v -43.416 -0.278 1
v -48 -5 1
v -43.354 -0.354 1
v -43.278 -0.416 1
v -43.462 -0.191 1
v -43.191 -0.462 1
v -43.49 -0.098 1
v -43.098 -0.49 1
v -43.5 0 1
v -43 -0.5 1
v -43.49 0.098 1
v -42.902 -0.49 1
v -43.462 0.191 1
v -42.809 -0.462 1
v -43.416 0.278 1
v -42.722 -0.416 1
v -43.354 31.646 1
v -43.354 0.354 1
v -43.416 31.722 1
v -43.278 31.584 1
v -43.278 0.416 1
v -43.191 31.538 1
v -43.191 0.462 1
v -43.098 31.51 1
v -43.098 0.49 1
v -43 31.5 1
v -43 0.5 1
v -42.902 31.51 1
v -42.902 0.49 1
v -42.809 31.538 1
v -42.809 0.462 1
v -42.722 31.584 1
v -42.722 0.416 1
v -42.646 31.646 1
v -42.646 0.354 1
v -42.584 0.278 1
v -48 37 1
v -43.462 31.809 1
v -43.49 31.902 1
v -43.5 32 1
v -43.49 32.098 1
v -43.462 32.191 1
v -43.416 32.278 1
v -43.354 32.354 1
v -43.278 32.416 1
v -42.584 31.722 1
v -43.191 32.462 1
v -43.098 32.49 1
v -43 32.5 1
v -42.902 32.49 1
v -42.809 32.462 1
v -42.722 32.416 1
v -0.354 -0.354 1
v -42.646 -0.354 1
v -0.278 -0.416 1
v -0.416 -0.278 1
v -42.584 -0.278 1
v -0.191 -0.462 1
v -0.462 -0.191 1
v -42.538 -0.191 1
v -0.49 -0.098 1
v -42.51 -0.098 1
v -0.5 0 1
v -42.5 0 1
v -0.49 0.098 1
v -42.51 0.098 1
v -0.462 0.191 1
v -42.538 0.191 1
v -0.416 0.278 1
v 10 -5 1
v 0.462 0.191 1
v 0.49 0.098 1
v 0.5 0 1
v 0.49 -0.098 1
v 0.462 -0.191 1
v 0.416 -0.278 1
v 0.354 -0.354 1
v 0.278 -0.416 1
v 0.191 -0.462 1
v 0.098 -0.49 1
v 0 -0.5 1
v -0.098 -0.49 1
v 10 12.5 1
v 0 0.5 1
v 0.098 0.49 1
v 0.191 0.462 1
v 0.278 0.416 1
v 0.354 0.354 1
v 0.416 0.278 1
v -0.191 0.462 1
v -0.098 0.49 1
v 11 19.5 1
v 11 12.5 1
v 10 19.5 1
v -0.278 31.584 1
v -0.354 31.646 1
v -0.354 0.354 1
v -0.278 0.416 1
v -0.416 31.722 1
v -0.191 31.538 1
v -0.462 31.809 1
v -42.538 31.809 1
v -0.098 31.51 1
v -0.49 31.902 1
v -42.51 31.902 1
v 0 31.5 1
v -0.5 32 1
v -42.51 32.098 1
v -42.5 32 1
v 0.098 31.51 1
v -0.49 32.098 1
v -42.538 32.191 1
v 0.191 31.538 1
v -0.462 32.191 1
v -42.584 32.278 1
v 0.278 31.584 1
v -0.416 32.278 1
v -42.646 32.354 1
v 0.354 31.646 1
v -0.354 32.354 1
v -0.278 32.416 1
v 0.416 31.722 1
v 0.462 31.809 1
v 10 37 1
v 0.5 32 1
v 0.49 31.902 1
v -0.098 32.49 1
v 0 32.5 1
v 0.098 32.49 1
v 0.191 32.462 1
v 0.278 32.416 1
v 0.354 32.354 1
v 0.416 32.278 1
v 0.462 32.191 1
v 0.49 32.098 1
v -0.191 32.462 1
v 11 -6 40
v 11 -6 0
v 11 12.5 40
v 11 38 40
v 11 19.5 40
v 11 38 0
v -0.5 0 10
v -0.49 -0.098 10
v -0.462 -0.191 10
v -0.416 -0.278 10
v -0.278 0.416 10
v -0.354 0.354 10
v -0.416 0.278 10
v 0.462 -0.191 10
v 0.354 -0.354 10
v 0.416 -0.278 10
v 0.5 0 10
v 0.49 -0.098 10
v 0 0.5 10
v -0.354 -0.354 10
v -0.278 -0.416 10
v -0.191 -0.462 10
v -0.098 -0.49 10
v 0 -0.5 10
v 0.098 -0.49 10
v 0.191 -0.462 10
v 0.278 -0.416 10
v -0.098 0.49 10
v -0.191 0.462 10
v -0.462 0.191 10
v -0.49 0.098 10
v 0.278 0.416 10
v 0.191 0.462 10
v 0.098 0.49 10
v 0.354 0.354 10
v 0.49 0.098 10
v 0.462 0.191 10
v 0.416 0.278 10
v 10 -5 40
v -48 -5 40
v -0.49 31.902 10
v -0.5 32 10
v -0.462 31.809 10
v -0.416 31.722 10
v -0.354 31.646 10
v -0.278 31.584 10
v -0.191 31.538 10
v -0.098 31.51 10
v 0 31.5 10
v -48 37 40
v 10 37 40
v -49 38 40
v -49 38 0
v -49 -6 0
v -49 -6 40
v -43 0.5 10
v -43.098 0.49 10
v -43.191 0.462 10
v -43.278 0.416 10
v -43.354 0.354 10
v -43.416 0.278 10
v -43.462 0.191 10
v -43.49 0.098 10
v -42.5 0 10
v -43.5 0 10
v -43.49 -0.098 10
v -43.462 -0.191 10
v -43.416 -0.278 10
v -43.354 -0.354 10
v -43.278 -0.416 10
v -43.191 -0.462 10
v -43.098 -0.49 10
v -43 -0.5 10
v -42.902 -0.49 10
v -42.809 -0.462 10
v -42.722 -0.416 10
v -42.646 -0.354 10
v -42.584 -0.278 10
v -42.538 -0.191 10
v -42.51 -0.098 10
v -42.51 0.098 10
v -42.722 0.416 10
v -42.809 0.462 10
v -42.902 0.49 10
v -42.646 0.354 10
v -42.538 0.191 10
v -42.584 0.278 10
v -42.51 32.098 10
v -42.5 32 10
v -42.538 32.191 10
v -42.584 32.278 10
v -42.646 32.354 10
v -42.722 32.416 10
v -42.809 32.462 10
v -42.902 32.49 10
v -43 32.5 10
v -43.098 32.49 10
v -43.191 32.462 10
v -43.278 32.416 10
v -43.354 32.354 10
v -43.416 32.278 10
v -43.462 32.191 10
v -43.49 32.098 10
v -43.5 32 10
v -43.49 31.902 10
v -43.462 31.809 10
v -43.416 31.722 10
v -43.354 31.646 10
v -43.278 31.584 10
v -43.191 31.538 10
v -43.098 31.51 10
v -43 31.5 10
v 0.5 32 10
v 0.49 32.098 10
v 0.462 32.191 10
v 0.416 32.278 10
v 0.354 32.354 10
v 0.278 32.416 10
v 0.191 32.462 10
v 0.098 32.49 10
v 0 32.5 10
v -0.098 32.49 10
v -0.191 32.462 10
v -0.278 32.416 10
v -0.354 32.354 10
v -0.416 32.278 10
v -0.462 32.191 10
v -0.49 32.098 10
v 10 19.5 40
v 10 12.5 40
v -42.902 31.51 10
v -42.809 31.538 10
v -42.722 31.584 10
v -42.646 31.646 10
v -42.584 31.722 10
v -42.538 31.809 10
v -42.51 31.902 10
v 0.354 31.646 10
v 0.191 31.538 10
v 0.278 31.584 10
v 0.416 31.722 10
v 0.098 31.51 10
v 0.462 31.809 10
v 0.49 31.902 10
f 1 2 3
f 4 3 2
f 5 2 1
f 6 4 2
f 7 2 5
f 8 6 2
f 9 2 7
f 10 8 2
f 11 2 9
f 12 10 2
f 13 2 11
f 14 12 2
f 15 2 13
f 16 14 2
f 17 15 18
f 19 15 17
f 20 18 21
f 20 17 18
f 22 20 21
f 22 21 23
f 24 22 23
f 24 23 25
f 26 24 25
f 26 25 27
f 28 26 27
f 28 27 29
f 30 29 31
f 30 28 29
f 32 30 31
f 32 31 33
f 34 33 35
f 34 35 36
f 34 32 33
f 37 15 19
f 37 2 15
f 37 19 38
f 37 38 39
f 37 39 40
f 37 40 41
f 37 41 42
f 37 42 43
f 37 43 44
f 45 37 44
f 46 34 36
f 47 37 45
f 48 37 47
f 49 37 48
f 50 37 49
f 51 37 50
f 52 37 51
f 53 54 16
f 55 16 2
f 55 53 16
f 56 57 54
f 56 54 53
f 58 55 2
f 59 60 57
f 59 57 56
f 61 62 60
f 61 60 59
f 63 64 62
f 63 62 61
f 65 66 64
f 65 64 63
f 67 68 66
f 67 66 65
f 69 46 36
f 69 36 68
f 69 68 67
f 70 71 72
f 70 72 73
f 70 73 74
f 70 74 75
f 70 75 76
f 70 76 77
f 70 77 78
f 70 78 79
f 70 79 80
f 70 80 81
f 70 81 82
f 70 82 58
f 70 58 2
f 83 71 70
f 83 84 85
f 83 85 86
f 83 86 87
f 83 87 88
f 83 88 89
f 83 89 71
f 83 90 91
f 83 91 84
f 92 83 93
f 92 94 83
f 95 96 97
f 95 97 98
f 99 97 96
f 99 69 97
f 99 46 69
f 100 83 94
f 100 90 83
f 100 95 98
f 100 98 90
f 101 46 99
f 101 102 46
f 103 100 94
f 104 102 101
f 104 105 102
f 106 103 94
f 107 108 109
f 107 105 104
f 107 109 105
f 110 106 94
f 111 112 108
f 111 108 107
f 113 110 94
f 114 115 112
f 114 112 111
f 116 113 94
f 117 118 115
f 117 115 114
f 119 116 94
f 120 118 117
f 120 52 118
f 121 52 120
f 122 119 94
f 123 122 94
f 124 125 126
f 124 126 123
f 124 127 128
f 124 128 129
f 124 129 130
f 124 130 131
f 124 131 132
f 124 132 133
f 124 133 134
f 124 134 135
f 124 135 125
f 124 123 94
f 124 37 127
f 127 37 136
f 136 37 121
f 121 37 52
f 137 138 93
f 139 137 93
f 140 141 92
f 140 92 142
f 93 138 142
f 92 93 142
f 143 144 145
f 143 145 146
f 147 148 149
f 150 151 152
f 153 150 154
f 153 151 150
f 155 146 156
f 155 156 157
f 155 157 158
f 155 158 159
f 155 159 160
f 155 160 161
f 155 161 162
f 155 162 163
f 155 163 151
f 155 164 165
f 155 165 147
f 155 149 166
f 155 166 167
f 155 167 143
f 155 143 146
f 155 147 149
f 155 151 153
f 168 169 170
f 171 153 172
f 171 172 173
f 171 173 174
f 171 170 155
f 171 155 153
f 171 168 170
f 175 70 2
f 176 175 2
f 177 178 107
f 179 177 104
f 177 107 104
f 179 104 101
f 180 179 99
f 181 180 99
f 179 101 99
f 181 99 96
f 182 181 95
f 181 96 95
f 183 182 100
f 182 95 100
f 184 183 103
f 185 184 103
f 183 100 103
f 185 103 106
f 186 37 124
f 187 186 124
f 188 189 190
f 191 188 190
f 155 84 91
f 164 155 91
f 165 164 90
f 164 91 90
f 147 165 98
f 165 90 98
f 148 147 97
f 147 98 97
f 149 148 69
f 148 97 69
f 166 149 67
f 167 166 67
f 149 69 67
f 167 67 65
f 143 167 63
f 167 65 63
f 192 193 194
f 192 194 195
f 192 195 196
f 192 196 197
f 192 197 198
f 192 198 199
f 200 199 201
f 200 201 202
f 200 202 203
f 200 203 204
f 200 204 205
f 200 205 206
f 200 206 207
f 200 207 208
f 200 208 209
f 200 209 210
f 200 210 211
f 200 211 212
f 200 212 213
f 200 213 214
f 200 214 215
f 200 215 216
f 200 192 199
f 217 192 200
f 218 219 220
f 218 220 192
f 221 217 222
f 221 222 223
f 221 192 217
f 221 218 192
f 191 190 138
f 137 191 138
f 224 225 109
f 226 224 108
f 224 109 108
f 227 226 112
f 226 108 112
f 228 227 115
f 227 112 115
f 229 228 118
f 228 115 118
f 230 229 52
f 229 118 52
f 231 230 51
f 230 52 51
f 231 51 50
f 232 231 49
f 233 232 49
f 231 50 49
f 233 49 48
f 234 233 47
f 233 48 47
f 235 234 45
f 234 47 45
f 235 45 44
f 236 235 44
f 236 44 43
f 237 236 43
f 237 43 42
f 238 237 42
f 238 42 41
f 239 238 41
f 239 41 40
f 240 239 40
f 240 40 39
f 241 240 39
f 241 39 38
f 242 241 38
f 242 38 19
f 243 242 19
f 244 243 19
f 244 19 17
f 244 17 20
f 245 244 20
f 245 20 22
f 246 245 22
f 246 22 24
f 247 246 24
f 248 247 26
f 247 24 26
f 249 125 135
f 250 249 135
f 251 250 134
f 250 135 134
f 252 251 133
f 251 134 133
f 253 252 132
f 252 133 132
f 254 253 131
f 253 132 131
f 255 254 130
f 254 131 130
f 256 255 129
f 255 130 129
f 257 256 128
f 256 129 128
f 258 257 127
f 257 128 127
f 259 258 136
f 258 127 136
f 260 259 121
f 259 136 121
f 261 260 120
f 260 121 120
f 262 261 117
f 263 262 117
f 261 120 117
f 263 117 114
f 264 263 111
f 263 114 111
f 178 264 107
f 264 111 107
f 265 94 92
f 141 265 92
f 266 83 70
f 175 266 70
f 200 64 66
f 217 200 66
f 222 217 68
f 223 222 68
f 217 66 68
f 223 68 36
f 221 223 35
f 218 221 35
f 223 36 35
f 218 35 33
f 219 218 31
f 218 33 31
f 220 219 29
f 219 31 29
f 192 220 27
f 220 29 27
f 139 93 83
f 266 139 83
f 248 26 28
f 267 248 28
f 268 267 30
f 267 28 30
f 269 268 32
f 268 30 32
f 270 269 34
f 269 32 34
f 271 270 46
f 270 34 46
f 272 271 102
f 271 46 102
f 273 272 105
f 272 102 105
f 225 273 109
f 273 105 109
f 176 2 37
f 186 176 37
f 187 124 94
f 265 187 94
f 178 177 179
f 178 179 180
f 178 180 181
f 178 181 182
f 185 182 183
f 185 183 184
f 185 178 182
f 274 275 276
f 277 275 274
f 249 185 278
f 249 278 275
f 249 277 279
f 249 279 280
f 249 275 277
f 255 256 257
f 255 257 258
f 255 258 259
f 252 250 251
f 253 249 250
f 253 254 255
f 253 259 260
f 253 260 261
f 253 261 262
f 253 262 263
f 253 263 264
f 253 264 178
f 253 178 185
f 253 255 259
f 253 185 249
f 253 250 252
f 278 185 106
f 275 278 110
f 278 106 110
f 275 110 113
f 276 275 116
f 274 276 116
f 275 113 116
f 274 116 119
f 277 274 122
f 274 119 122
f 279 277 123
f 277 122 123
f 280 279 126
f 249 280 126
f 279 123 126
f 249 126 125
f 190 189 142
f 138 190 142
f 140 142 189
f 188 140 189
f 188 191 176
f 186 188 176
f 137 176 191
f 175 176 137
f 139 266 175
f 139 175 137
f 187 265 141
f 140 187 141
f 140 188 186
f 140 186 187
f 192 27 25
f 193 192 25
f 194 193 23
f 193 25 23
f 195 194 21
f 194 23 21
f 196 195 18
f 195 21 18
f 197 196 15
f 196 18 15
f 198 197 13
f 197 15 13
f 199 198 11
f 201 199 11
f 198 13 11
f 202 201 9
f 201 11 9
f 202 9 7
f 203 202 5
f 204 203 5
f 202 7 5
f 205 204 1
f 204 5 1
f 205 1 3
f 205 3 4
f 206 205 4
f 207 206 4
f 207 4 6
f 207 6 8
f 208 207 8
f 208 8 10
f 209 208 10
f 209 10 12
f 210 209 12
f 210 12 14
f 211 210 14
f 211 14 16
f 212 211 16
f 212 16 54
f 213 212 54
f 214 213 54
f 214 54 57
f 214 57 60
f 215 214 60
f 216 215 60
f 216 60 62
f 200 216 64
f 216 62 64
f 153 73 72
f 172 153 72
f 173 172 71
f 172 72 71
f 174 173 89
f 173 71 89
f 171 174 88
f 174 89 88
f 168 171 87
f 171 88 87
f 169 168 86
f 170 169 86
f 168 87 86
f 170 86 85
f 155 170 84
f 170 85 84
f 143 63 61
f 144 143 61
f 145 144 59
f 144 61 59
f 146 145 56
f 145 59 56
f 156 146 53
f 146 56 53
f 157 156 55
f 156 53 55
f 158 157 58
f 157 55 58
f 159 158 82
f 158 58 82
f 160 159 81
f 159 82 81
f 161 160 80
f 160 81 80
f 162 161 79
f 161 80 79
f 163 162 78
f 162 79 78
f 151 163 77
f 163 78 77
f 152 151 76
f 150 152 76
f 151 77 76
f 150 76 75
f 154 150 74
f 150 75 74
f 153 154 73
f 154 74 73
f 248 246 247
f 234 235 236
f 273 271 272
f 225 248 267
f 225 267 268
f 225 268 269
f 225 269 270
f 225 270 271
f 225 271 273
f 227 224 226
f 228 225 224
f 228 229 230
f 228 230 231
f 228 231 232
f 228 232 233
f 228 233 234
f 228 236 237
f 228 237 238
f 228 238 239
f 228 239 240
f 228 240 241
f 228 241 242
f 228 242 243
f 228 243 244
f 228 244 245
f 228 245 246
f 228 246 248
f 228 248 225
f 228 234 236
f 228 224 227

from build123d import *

# Parameters (mm, degrees)
F1_DEPTH = 40
F0_W     = 1
F0_H     = 7
F2_DEPTH = 1
F3_DEPTH = 10


with BuildPart() as f1:
    # F0 (on Top) → F1 (new body)
    with BuildSketch(Plane.XY):
        Polygon((10, -5), (-48, -5), (-48, 37), (10, 37), (10, 19.5), (11, 19.5), (11, 38), (-49, 38), (-49, -6), (11, -6), (11, 12.5), (10, 12.5), align=None)
    extrude(amount=F1_DEPTH)

    # F0 (on Top) → F2 (join)
    with BuildSketch(Plane.XY):
        Polygon((-48, 37), (-48, -5), (10, -5), (10, 12.5), (10, 19.5), (10, 37), align=None)
        with BuildLine():
            Line((-0.5, 0), (-42.5, 0))
            ThreePointArc((-42.5, 0), (-43.3535533906, -0.3535533906), (-43, 0.5))
            Line((-43, 0.5), (-43, 31.5))
            ThreePointArc((-43, 31.5), (-43.3535533906, 32.3535533906), (-42.5, 32))
            Line((-42.5, 32), (-0.5, 32))
            ThreePointArc((-0.5, 32), (0, 32.5), (0.5, 32))
            ThreePointArc((0.5, 32), (0.3535533906, 31.6464466094), (0, 31.5))
            Line((0, 31.5), (0, 0.5))
            ThreePointArc((0, 0.5), (0.3535533906, 0.3535533906), (0.5, 0))
            ThreePointArc((0.5, 0), (0, -0.5), (-0.5, 0))
        make_face(mode=Mode.SUBTRACT)
        with BuildLine():
            ThreePointArc((-43, 0.5), (-42.6464466094, 0.3535533906), (-42.5, 0))
            Line((-42.5, 0), (-0.5, 0))
            ThreePointArc((-0.5, 0), (-0.3535533906, 0.3535533906), (0, 0.5))
            Line((0, 0.5), (0, 31.5))
            ThreePointArc((0, 31.5), (-0.3535533906, 31.6464466094), (-0.5, 32))
            Line((-0.5, 32), (-42.5, 32))
            ThreePointArc((-42.5, 32), (-42.6464466094, 31.6464466094), (-43, 31.5))
            Line((-43, 31.5), (-43, 0.5))
        make_face()
        Polygon((10, -5), (-48, -5), (-48, 37), (10, 37), (10, 19.5), (11, 19.5), (11, 38), (-49, 38), (-49, -6), (11, -6), (11, 12.5), (10, 12.5), align=None)
        with Locations((10.5, 16)):
            Rectangle(F0_W, F0_H)
        with BuildLine():
            Line((-42.5, 0), (-43, 0))
            Line((-43, 0), (-43, 0.5))
            ThreePointArc((-43, 0.5), (-43.3535533906, -0.3535533906), (-42.5, 0))
        make_face()
        with BuildLine():
            Line((0, 0), (-0.5, 0))
            ThreePointArc((-0.5, 0), (0, -0.5), (0.5, 0))
            ThreePointArc((0.5, 0), (0.3535533906, 0.3535533906), (0, 0.5))
            Line((0, 0.5), (0, 0))
        make_face()
        with BuildLine():
            Line((0, 32), (0, 31.5))
            ThreePointArc((0, 31.5), (0.3535533906, 31.6464466094), (0.5, 32))
            ThreePointArc((0.5, 32), (0, 32.5), (-0.5, 32))
            Line((-0.5, 32), (0, 32))
        make_face()
        with BuildLine():
            ThreePointArc((-42.5, 32), (-43.3535533906, 32.3535533906), (-43, 31.5))
            Line((-43, 31.5), (-43, 32))
            Line((-43, 32), (-42.5, 32))
        make_face()
        with BuildLine():
            Line((-43, 0.5), (-43, 0))
            Line((-43, 0), (-42.5, 0))
            ThreePointArc((-42.5, 0), (-42.6464466094, 0.3535533906), (-43, 0.5))
        make_face()
        with BuildLine():
            ThreePointArc((0, 0.5), (-0.3535533906, 0.3535533906), (-0.5, 0))
            Line((-0.5, 0), (0, 0))
            Line((0, 0), (0, 0.5))
        make_face()
        with BuildLine():
            ThreePointArc((-0.5, 32), (-0.3535533906, 31.6464466094), (0, 31.5))
            Line((0, 31.5), (0, 32))
            Line((0, 32), (-0.5, 32))
        make_face()
        with BuildLine():
            Line((-43, 32), (-43, 31.5))
            ThreePointArc((-43, 31.5), (-42.6464466094, 31.6464466094), (-42.5, 32))
            Line((-42.5, 32), (-43, 32))
        make_face()
    extrude(amount=F2_DEPTH)

    # F0 (on Top) → F3 (join)
    with BuildSketch(Plane.XY):
        with BuildLine():
            ThreePointArc((-42.5, 32), (-43.3535533906, 32.3535533906), (-43, 31.5))
            Line((-43, 31.5), (-43, 32))
            Line((-43, 32), (-42.5, 32))
        make_face()
        with BuildLine():
            Line((-43, 32), (-43, 31.5))
            ThreePointArc((-43, 31.5), (-42.6464466094, 31.6464466094), (-42.5, 32))
            Line((-42.5, 32), (-43, 32))
        make_face()
        with BuildLine():
            ThreePointArc((-0.5, 32), (-0.3535533906, 31.6464466094), (0, 31.5))
            Line((0, 31.5), (0, 32))
            Line((0, 32), (-0.5, 32))
        make_face()
        with BuildLine():
            Line((0, 32), (0, 31.5))
            ThreePointArc((0, 31.5), (0.3535533906, 31.6464466094), (0.5, 32))
            ThreePointArc((0.5, 32), (0, 32.5), (-0.5, 32))
            Line((-0.5, 32), (0, 32))
        make_face()
        with BuildLine():
            Line((0, 0), (-0.5, 0))
            ThreePointArc((-0.5, 0), (0, -0.5), (0.5, 0))
            ThreePointArc((0.5, 0), (0.3535533906, 0.3535533906), (0, 0.5))
            Line((0, 0.5), (0, 0))
        make_face()
        with BuildLine():
            ThreePointArc((0, 0.5), (-0.3535533906, 0.3535533906), (-0.5, 0))
            Line((-0.5, 0), (0, 0))
            Line((0, 0), (0, 0.5))
        make_face()
        with BuildLine():
            Line((-43, 0.5), (-43, 0))
            Line((-43, 0), (-42.5, 0))
            ThreePointArc((-42.5, 0), (-42.6464466094, 0.3535533906), (-43, 0.5))
        make_face()
        with BuildLine():
            Line((-42.5, 0), (-43, 0))
            Line((-43, 0), (-43, 0.5))
            ThreePointArc((-43, 0.5), (-43.3535533906, -0.3535533906), (-42.5, 0))
        make_face()
    extrude(amount=F3_DEPTH)


solid = f1.part
